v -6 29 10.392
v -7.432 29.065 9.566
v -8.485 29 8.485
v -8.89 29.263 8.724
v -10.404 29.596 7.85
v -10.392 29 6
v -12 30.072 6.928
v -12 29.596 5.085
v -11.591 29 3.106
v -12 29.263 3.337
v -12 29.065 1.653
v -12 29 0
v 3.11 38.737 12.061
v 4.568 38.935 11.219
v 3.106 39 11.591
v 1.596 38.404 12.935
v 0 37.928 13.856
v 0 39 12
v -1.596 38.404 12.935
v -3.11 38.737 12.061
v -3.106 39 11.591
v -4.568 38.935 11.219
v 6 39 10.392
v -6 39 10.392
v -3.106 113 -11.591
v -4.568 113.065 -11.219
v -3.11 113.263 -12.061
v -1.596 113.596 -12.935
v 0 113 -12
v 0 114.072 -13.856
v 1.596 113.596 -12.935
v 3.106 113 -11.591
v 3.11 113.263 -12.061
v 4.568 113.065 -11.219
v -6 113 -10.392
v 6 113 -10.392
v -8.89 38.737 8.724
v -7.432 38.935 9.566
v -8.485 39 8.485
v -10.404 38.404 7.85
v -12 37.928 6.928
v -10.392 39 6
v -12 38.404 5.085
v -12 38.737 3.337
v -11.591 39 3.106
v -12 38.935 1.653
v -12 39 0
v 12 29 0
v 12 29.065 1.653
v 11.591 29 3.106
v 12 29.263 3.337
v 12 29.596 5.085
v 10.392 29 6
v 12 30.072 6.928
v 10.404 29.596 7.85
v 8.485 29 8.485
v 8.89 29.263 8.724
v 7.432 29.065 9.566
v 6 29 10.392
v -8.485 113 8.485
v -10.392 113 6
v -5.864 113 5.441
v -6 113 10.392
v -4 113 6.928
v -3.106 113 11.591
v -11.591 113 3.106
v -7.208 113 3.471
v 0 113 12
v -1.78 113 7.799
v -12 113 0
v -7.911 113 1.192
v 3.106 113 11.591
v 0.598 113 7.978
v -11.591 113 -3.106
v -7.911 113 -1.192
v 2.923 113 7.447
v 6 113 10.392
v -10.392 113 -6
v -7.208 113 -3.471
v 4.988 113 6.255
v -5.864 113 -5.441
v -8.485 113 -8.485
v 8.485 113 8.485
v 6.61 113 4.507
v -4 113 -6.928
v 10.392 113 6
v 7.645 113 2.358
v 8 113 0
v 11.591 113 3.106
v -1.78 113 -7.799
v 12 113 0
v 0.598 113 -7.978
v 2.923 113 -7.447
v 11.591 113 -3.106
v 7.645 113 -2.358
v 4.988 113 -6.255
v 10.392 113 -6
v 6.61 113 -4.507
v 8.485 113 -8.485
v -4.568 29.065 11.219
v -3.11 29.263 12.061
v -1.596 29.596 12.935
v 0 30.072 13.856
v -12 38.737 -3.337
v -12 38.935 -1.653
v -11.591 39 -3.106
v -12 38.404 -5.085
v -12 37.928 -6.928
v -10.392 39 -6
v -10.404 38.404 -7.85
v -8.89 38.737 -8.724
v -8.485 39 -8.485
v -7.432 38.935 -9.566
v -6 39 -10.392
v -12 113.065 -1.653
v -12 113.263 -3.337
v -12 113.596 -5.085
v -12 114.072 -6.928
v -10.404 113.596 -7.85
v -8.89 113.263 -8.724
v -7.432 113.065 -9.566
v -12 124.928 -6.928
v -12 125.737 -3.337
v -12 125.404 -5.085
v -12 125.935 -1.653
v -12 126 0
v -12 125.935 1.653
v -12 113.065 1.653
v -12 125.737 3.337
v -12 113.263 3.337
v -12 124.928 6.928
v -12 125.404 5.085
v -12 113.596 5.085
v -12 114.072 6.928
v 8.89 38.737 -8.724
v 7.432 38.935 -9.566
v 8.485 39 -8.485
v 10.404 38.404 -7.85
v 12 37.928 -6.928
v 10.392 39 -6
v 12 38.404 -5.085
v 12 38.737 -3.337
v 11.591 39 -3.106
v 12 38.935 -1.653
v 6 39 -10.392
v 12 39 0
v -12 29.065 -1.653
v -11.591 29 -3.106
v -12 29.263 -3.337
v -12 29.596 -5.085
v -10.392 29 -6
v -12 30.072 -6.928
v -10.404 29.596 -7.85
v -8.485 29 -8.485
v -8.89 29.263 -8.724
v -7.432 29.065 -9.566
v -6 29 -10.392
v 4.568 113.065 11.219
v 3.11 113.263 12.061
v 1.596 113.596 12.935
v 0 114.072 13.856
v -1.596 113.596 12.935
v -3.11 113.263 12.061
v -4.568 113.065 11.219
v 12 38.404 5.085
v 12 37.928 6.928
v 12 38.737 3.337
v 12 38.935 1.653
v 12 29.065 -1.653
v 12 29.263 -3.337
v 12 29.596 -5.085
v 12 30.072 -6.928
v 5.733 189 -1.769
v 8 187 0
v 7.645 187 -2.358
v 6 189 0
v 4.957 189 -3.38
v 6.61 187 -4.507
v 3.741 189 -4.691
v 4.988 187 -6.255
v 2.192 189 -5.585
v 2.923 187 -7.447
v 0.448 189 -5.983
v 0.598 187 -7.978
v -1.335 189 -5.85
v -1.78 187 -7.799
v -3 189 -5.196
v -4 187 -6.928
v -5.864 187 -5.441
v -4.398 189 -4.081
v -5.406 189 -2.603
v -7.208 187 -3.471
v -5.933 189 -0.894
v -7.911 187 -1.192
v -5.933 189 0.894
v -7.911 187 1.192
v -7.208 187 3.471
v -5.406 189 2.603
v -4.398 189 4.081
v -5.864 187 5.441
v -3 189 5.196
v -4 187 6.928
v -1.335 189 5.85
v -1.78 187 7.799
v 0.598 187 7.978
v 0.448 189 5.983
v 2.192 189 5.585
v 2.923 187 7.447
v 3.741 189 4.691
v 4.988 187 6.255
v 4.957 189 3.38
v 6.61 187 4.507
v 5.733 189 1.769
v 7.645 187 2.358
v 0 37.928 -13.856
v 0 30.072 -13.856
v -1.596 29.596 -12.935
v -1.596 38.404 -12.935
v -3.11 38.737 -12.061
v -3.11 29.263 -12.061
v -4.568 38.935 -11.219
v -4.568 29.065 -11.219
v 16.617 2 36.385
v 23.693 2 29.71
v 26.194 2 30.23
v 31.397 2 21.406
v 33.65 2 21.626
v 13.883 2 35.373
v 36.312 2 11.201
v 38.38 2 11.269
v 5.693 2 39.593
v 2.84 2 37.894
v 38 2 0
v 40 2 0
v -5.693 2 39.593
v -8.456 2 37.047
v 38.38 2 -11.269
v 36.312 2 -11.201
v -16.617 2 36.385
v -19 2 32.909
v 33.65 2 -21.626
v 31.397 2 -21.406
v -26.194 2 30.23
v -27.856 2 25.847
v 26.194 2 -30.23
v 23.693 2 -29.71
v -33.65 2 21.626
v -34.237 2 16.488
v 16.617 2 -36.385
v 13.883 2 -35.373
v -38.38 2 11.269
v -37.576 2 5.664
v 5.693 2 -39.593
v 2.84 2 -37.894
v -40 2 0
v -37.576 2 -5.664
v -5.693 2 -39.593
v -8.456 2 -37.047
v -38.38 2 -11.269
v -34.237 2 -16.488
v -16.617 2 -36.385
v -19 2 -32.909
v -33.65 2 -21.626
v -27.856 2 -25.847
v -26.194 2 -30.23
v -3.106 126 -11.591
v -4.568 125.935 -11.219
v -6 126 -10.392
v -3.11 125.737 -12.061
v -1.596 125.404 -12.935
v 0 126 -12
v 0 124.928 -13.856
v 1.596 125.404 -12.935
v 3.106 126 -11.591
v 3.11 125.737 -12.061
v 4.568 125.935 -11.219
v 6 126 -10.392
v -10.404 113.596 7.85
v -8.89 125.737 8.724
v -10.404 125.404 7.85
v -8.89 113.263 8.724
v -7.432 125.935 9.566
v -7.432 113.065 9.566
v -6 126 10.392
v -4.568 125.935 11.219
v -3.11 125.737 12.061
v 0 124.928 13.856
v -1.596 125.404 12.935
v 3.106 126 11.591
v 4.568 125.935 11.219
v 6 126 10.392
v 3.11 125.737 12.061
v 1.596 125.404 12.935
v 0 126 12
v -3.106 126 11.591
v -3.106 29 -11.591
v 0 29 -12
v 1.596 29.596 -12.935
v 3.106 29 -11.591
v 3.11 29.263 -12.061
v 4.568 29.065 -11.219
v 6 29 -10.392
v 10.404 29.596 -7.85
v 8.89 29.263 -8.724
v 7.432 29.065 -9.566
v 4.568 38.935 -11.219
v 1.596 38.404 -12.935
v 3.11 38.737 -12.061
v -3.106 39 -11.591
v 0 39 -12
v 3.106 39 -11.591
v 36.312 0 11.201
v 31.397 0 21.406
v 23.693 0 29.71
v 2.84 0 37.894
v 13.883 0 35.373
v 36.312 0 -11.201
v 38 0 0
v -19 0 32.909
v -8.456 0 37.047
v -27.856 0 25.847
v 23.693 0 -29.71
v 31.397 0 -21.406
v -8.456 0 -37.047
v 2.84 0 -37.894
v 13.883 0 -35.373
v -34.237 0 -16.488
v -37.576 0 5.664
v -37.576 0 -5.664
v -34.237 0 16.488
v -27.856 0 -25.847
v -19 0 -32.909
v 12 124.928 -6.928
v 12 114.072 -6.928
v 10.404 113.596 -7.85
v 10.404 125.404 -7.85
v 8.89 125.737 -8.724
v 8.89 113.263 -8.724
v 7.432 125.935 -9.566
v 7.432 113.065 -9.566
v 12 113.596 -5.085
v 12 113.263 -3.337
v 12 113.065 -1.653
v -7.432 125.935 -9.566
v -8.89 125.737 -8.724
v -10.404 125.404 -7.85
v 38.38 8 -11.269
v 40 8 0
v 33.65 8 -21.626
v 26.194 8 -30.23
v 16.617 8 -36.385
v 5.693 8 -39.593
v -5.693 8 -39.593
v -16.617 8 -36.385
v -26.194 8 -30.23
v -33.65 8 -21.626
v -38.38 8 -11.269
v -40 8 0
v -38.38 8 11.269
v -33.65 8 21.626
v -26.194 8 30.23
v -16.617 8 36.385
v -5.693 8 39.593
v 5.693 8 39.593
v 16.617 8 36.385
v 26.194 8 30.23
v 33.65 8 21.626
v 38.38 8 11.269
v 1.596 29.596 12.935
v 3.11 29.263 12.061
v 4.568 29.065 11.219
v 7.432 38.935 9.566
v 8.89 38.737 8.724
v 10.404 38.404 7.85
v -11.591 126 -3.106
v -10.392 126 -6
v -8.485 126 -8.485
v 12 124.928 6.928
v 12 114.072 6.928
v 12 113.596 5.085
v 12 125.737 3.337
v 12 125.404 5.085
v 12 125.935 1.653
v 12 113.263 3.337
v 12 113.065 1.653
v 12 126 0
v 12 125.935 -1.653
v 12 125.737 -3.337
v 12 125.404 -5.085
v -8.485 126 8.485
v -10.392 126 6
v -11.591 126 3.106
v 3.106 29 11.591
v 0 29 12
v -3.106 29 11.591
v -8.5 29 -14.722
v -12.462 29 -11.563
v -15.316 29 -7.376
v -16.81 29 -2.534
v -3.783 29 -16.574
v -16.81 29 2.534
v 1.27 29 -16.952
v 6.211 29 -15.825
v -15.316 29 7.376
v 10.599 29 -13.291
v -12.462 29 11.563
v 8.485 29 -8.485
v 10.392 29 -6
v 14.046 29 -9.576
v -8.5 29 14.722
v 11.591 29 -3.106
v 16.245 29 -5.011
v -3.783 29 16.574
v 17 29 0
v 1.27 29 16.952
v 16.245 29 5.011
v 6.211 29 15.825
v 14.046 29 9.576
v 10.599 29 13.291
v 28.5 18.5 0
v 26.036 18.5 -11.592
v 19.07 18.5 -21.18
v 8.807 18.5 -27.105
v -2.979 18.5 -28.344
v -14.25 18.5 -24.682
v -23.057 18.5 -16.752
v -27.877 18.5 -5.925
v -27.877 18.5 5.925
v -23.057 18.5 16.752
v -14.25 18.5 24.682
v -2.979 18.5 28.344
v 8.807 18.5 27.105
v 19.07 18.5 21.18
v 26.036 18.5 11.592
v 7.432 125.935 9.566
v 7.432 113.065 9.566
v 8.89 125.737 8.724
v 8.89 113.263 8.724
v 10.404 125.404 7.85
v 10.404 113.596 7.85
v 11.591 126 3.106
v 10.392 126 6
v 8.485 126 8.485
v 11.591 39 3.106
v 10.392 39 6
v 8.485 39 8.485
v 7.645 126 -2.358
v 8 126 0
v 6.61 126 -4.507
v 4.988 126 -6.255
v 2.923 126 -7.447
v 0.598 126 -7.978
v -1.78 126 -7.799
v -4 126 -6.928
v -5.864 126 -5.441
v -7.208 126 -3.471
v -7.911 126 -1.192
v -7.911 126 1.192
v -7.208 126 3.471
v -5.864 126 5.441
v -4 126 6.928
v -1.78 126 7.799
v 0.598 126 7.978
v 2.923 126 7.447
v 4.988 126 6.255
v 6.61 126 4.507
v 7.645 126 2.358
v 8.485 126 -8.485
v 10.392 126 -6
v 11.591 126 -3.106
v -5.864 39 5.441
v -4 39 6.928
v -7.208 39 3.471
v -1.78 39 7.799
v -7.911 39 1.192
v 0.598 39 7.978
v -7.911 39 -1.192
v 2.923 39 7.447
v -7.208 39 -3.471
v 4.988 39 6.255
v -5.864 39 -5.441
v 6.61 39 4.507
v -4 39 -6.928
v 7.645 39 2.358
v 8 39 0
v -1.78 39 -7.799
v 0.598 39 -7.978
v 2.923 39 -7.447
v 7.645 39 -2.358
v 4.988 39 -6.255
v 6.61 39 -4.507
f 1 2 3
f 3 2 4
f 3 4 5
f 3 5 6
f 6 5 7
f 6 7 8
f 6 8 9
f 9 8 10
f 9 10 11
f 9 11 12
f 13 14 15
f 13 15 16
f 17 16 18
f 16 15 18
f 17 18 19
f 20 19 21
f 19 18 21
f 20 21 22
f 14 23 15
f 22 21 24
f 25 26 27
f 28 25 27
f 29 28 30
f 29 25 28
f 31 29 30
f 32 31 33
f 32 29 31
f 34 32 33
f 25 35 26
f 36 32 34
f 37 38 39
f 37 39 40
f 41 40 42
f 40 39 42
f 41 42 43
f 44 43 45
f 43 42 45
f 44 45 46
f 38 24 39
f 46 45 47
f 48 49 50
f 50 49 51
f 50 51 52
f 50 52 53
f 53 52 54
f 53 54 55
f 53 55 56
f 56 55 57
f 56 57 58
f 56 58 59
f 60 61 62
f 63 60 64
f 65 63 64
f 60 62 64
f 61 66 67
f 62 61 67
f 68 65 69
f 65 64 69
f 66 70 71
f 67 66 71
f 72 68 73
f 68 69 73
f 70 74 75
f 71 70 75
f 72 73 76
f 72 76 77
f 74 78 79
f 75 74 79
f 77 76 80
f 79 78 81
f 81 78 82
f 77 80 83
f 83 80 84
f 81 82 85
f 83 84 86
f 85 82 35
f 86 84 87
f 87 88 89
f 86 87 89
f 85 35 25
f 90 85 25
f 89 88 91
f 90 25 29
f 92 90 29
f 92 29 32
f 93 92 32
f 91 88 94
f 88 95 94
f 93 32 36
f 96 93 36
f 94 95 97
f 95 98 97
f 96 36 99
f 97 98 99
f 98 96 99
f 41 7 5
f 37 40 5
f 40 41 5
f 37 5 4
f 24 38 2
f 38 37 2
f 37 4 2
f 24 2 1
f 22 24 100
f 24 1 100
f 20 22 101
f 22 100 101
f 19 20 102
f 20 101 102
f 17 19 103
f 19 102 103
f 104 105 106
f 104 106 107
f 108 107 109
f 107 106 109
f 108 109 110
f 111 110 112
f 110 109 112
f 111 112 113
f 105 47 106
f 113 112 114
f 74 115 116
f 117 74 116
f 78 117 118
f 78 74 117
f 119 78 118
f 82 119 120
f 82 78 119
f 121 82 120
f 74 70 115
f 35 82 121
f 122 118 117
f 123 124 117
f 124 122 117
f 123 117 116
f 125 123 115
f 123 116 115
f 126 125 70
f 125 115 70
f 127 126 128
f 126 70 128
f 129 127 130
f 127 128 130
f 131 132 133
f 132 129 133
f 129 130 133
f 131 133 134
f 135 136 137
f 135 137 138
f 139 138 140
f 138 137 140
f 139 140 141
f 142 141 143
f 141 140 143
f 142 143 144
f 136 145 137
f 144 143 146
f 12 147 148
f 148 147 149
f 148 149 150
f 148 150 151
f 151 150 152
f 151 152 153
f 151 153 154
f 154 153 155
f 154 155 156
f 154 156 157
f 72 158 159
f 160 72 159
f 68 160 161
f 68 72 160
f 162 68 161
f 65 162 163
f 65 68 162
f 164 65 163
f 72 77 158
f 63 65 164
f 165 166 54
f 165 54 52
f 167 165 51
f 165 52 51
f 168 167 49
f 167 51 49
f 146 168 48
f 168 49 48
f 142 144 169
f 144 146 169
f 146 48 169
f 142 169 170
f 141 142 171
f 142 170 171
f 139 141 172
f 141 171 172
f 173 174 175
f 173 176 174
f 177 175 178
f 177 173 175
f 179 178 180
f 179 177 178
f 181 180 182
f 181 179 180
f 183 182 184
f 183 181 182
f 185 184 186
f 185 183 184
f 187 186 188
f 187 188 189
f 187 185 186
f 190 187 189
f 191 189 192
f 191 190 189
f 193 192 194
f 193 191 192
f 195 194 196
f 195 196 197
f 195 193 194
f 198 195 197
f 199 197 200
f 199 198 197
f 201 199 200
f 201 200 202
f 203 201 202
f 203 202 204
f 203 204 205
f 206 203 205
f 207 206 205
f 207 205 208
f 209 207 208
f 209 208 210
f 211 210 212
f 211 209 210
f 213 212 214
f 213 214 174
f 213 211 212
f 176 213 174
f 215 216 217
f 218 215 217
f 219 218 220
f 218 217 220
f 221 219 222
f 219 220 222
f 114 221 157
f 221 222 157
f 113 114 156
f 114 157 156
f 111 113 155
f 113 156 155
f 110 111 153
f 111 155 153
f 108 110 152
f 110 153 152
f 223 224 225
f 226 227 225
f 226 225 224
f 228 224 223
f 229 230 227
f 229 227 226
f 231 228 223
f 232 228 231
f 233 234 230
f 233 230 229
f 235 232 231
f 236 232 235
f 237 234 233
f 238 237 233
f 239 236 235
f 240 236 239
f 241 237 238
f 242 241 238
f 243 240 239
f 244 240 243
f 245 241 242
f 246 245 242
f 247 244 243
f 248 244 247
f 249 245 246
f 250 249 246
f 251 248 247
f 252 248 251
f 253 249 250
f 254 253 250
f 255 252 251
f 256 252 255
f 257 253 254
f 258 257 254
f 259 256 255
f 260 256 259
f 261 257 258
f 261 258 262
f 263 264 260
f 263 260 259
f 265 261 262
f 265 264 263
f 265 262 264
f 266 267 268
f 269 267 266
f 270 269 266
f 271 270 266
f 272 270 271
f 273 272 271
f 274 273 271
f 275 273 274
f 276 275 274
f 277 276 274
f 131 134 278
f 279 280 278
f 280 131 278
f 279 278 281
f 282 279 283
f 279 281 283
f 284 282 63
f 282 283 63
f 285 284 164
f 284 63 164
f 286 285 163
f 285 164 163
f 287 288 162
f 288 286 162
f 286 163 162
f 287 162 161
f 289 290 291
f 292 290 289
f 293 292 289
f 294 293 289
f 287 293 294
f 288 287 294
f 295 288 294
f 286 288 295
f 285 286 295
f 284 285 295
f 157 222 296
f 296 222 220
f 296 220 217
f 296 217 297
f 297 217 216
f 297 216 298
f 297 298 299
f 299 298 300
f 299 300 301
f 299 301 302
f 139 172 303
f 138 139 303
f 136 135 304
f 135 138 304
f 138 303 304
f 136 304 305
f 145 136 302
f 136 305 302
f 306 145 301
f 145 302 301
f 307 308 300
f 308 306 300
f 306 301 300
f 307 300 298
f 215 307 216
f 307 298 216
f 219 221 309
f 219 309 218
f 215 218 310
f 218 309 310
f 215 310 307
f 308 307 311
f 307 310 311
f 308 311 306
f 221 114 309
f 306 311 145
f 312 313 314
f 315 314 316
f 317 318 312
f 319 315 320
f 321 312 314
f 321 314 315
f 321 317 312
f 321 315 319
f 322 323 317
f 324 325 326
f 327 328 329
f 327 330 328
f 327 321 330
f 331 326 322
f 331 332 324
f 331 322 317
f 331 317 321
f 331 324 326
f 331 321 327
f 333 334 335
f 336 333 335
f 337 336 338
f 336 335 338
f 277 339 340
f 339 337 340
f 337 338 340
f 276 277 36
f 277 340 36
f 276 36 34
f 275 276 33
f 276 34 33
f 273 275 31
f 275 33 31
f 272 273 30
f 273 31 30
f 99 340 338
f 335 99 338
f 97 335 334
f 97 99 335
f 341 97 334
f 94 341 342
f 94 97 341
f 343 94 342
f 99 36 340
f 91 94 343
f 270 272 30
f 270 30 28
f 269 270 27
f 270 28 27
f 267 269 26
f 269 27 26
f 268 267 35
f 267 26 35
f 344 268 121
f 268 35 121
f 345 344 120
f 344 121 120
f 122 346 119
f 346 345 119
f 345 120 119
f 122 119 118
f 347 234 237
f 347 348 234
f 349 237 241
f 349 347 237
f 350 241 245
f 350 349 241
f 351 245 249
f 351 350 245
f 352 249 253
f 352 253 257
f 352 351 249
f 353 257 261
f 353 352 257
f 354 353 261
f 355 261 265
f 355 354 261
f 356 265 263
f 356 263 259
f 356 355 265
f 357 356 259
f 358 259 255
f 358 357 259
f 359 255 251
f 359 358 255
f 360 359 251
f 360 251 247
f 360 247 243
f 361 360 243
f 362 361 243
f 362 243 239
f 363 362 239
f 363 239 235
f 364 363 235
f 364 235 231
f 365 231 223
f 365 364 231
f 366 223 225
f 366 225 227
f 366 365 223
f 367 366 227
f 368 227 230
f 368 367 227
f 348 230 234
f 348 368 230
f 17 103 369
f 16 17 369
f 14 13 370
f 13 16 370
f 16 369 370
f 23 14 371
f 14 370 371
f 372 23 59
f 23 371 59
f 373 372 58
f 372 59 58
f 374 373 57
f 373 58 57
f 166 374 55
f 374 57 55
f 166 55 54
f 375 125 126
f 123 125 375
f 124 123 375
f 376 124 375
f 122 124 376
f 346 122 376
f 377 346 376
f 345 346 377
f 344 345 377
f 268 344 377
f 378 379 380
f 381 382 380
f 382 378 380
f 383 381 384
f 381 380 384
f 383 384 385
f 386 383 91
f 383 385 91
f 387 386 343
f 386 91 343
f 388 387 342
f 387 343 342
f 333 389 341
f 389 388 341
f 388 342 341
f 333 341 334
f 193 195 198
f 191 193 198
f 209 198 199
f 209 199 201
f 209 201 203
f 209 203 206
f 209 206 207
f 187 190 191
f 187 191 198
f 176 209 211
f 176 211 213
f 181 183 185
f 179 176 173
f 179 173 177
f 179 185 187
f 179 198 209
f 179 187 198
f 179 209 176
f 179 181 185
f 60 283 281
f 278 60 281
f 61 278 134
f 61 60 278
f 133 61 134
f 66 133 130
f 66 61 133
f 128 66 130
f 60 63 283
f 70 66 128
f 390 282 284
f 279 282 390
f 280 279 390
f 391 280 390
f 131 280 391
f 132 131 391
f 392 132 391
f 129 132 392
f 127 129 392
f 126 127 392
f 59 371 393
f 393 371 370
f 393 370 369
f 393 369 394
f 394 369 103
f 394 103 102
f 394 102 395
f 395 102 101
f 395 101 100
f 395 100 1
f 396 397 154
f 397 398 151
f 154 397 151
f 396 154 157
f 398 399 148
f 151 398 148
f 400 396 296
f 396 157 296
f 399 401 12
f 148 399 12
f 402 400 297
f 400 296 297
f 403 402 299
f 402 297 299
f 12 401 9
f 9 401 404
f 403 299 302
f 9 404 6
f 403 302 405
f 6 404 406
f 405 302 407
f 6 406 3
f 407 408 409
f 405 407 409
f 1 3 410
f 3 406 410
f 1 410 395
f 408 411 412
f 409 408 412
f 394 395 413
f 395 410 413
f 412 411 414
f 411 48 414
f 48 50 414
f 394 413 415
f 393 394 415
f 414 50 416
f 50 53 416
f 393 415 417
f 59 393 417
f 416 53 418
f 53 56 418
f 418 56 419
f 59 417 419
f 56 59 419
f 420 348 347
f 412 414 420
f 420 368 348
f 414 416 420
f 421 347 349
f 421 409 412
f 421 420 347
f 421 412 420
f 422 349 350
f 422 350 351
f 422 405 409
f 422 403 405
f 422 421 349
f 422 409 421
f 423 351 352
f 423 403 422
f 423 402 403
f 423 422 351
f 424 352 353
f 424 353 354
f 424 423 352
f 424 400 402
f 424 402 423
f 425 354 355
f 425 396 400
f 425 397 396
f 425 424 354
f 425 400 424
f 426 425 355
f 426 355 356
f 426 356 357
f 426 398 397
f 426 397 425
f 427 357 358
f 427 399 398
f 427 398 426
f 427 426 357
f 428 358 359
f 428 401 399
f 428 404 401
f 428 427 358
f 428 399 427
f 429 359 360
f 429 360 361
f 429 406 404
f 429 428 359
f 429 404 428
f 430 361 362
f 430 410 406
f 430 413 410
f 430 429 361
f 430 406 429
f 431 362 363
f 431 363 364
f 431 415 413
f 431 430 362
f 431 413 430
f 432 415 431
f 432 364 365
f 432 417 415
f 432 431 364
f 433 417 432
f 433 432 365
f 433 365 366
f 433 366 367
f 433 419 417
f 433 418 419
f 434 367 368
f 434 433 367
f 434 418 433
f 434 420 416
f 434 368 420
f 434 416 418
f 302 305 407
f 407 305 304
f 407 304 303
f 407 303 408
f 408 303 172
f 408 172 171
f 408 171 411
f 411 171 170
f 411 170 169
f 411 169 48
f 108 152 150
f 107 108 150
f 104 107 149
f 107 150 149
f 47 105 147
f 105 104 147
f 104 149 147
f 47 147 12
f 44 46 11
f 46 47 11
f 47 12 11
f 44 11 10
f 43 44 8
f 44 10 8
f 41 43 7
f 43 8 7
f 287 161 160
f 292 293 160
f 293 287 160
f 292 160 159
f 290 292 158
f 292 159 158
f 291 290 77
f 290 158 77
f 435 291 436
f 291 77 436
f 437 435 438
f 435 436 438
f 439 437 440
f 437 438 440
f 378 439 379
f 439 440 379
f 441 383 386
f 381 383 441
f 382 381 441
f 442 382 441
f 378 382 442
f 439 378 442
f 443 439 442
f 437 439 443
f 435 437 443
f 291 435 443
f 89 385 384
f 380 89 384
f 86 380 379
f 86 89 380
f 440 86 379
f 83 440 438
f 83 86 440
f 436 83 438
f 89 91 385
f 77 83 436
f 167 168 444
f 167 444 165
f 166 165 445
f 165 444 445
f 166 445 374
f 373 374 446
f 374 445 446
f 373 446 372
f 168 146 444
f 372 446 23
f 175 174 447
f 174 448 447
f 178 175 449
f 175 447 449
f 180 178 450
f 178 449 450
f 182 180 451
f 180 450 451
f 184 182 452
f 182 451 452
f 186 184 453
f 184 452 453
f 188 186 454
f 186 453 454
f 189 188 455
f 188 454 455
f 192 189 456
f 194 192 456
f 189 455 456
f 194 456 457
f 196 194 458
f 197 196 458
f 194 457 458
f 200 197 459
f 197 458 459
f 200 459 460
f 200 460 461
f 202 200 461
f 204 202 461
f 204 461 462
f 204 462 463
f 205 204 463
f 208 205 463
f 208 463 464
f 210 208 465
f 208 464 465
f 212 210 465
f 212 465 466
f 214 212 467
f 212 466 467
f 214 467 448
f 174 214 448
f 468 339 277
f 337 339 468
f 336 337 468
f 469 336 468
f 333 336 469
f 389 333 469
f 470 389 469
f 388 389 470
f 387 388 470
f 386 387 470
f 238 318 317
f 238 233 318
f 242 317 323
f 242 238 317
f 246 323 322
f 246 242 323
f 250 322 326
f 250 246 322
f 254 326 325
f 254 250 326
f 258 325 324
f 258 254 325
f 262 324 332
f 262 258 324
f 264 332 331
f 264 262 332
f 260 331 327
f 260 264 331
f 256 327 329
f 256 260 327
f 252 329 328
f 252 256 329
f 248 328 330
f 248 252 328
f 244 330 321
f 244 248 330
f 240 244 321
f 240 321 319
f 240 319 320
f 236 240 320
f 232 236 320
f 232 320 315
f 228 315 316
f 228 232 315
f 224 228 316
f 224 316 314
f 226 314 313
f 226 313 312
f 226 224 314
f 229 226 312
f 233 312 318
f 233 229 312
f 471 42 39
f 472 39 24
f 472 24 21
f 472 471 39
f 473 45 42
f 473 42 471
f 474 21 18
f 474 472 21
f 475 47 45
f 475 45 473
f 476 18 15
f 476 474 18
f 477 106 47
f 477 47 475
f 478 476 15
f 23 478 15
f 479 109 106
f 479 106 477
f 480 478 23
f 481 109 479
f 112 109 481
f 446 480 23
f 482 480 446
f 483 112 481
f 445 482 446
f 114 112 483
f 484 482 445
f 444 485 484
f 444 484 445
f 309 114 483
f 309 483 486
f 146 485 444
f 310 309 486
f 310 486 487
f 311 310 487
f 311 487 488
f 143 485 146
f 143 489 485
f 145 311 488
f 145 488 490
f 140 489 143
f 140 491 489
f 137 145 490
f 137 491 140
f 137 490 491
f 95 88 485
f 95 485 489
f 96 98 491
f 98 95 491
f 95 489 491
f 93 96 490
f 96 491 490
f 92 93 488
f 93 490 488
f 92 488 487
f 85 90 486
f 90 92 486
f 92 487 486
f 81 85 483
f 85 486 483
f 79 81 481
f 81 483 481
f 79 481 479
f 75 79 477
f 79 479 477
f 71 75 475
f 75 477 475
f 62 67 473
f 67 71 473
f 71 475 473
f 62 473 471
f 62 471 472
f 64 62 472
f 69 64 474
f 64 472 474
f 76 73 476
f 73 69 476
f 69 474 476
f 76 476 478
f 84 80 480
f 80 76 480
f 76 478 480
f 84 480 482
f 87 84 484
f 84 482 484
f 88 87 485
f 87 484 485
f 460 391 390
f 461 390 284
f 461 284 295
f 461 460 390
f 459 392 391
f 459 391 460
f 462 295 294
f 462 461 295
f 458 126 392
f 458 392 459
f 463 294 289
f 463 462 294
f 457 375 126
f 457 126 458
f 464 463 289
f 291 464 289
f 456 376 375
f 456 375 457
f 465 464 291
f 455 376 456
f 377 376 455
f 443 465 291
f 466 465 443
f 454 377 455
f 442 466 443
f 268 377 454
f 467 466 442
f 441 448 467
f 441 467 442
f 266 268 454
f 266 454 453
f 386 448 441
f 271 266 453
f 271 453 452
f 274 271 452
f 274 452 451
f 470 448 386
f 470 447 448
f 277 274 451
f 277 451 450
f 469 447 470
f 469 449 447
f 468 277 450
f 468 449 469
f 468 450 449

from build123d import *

# Parameters (mm, degrees)
EXTRUDE_1_DEPTH = 10
EXTRUDE_2_DEPTH = 13


with BuildPart() as part:
    # Эскиз1 → Повернуть1 (revolve)
    with BuildSketch(Plane.XY, mode=Mode.PRIVATE) as revolve_1_sk:
        Polygon((0, 0), (-38, 0), (-38, 2), (-40, 2), (-40, 8), (-17, 29), (-8, 29), (-8, 39), (-8, 187), (-6, 189), (0, 189), align=None)
    revolve(revolve_1_sk.sketch.rotate(Axis((0, 0, 0), (0, 1, 0)), 180), axis=Axis((0, 0, 0), (0, 1, 0)))  # turned: the seam where the file's is

    # Эскиз2 → Бобышка-Вытянуть1 (add)
    with BuildSketch(Plane(origin=(0, 29, 0), x_dir=(1, 0, 0), z_dir=(0, 1, 0))):
        Polygon((0, 13.856406461), (-12, 6.92820323), (-12, -6.92820323), (0, -13.856406461), (12, -6.92820323), (12, 6.92820323), align=None)
    extrude(amount=EXTRUDE_1_DEPTH)

    # Эскиз3 → Бобышка-Вытянуть2 (add)
    with BuildSketch(Plane(origin=(0, 113, 0), x_dir=(1, 0, 0), z_dir=(0, 1, 0))):
        Polygon((12, 6.92820323), (0, 13.856406461), (-12, 6.92820323), (-12, -6.92820323), (0, -13.856406461), (12, -6.92820323), align=None)
    extrude(amount=EXTRUDE_2_DEPTH)

    # Эскиз4 → Вырез-Повернуть2 (revolve, cut)
    with BuildSketch(Plane.XY, mode=Mode.PRIVATE) as cut_revolve_2_sk:
        Polygon((-23.258330249, 126), (-12, 126), (-23.258330249, 119.5), align=None)
        Polygon((-23.258330249, 113), (-23.258330249, 119.5), (-12, 113), align=None)
        Polygon((-20.660254038, 39), (-20.660254038, 34), (-12, 39), align=None)
        Polygon((-20.660254038, 34), (-20.660254038, 29), (-12, 29), align=None)
    revolve(cut_revolve_2_sk.sketch.rotate(Axis((0, 189, 0), (0, -1, 0)), 180), axis=Axis((0, 189, 0), (0, -1, 0)), mode=Mode.SUBTRACT)  # turned: the seam where the file's is


solid = part.part
